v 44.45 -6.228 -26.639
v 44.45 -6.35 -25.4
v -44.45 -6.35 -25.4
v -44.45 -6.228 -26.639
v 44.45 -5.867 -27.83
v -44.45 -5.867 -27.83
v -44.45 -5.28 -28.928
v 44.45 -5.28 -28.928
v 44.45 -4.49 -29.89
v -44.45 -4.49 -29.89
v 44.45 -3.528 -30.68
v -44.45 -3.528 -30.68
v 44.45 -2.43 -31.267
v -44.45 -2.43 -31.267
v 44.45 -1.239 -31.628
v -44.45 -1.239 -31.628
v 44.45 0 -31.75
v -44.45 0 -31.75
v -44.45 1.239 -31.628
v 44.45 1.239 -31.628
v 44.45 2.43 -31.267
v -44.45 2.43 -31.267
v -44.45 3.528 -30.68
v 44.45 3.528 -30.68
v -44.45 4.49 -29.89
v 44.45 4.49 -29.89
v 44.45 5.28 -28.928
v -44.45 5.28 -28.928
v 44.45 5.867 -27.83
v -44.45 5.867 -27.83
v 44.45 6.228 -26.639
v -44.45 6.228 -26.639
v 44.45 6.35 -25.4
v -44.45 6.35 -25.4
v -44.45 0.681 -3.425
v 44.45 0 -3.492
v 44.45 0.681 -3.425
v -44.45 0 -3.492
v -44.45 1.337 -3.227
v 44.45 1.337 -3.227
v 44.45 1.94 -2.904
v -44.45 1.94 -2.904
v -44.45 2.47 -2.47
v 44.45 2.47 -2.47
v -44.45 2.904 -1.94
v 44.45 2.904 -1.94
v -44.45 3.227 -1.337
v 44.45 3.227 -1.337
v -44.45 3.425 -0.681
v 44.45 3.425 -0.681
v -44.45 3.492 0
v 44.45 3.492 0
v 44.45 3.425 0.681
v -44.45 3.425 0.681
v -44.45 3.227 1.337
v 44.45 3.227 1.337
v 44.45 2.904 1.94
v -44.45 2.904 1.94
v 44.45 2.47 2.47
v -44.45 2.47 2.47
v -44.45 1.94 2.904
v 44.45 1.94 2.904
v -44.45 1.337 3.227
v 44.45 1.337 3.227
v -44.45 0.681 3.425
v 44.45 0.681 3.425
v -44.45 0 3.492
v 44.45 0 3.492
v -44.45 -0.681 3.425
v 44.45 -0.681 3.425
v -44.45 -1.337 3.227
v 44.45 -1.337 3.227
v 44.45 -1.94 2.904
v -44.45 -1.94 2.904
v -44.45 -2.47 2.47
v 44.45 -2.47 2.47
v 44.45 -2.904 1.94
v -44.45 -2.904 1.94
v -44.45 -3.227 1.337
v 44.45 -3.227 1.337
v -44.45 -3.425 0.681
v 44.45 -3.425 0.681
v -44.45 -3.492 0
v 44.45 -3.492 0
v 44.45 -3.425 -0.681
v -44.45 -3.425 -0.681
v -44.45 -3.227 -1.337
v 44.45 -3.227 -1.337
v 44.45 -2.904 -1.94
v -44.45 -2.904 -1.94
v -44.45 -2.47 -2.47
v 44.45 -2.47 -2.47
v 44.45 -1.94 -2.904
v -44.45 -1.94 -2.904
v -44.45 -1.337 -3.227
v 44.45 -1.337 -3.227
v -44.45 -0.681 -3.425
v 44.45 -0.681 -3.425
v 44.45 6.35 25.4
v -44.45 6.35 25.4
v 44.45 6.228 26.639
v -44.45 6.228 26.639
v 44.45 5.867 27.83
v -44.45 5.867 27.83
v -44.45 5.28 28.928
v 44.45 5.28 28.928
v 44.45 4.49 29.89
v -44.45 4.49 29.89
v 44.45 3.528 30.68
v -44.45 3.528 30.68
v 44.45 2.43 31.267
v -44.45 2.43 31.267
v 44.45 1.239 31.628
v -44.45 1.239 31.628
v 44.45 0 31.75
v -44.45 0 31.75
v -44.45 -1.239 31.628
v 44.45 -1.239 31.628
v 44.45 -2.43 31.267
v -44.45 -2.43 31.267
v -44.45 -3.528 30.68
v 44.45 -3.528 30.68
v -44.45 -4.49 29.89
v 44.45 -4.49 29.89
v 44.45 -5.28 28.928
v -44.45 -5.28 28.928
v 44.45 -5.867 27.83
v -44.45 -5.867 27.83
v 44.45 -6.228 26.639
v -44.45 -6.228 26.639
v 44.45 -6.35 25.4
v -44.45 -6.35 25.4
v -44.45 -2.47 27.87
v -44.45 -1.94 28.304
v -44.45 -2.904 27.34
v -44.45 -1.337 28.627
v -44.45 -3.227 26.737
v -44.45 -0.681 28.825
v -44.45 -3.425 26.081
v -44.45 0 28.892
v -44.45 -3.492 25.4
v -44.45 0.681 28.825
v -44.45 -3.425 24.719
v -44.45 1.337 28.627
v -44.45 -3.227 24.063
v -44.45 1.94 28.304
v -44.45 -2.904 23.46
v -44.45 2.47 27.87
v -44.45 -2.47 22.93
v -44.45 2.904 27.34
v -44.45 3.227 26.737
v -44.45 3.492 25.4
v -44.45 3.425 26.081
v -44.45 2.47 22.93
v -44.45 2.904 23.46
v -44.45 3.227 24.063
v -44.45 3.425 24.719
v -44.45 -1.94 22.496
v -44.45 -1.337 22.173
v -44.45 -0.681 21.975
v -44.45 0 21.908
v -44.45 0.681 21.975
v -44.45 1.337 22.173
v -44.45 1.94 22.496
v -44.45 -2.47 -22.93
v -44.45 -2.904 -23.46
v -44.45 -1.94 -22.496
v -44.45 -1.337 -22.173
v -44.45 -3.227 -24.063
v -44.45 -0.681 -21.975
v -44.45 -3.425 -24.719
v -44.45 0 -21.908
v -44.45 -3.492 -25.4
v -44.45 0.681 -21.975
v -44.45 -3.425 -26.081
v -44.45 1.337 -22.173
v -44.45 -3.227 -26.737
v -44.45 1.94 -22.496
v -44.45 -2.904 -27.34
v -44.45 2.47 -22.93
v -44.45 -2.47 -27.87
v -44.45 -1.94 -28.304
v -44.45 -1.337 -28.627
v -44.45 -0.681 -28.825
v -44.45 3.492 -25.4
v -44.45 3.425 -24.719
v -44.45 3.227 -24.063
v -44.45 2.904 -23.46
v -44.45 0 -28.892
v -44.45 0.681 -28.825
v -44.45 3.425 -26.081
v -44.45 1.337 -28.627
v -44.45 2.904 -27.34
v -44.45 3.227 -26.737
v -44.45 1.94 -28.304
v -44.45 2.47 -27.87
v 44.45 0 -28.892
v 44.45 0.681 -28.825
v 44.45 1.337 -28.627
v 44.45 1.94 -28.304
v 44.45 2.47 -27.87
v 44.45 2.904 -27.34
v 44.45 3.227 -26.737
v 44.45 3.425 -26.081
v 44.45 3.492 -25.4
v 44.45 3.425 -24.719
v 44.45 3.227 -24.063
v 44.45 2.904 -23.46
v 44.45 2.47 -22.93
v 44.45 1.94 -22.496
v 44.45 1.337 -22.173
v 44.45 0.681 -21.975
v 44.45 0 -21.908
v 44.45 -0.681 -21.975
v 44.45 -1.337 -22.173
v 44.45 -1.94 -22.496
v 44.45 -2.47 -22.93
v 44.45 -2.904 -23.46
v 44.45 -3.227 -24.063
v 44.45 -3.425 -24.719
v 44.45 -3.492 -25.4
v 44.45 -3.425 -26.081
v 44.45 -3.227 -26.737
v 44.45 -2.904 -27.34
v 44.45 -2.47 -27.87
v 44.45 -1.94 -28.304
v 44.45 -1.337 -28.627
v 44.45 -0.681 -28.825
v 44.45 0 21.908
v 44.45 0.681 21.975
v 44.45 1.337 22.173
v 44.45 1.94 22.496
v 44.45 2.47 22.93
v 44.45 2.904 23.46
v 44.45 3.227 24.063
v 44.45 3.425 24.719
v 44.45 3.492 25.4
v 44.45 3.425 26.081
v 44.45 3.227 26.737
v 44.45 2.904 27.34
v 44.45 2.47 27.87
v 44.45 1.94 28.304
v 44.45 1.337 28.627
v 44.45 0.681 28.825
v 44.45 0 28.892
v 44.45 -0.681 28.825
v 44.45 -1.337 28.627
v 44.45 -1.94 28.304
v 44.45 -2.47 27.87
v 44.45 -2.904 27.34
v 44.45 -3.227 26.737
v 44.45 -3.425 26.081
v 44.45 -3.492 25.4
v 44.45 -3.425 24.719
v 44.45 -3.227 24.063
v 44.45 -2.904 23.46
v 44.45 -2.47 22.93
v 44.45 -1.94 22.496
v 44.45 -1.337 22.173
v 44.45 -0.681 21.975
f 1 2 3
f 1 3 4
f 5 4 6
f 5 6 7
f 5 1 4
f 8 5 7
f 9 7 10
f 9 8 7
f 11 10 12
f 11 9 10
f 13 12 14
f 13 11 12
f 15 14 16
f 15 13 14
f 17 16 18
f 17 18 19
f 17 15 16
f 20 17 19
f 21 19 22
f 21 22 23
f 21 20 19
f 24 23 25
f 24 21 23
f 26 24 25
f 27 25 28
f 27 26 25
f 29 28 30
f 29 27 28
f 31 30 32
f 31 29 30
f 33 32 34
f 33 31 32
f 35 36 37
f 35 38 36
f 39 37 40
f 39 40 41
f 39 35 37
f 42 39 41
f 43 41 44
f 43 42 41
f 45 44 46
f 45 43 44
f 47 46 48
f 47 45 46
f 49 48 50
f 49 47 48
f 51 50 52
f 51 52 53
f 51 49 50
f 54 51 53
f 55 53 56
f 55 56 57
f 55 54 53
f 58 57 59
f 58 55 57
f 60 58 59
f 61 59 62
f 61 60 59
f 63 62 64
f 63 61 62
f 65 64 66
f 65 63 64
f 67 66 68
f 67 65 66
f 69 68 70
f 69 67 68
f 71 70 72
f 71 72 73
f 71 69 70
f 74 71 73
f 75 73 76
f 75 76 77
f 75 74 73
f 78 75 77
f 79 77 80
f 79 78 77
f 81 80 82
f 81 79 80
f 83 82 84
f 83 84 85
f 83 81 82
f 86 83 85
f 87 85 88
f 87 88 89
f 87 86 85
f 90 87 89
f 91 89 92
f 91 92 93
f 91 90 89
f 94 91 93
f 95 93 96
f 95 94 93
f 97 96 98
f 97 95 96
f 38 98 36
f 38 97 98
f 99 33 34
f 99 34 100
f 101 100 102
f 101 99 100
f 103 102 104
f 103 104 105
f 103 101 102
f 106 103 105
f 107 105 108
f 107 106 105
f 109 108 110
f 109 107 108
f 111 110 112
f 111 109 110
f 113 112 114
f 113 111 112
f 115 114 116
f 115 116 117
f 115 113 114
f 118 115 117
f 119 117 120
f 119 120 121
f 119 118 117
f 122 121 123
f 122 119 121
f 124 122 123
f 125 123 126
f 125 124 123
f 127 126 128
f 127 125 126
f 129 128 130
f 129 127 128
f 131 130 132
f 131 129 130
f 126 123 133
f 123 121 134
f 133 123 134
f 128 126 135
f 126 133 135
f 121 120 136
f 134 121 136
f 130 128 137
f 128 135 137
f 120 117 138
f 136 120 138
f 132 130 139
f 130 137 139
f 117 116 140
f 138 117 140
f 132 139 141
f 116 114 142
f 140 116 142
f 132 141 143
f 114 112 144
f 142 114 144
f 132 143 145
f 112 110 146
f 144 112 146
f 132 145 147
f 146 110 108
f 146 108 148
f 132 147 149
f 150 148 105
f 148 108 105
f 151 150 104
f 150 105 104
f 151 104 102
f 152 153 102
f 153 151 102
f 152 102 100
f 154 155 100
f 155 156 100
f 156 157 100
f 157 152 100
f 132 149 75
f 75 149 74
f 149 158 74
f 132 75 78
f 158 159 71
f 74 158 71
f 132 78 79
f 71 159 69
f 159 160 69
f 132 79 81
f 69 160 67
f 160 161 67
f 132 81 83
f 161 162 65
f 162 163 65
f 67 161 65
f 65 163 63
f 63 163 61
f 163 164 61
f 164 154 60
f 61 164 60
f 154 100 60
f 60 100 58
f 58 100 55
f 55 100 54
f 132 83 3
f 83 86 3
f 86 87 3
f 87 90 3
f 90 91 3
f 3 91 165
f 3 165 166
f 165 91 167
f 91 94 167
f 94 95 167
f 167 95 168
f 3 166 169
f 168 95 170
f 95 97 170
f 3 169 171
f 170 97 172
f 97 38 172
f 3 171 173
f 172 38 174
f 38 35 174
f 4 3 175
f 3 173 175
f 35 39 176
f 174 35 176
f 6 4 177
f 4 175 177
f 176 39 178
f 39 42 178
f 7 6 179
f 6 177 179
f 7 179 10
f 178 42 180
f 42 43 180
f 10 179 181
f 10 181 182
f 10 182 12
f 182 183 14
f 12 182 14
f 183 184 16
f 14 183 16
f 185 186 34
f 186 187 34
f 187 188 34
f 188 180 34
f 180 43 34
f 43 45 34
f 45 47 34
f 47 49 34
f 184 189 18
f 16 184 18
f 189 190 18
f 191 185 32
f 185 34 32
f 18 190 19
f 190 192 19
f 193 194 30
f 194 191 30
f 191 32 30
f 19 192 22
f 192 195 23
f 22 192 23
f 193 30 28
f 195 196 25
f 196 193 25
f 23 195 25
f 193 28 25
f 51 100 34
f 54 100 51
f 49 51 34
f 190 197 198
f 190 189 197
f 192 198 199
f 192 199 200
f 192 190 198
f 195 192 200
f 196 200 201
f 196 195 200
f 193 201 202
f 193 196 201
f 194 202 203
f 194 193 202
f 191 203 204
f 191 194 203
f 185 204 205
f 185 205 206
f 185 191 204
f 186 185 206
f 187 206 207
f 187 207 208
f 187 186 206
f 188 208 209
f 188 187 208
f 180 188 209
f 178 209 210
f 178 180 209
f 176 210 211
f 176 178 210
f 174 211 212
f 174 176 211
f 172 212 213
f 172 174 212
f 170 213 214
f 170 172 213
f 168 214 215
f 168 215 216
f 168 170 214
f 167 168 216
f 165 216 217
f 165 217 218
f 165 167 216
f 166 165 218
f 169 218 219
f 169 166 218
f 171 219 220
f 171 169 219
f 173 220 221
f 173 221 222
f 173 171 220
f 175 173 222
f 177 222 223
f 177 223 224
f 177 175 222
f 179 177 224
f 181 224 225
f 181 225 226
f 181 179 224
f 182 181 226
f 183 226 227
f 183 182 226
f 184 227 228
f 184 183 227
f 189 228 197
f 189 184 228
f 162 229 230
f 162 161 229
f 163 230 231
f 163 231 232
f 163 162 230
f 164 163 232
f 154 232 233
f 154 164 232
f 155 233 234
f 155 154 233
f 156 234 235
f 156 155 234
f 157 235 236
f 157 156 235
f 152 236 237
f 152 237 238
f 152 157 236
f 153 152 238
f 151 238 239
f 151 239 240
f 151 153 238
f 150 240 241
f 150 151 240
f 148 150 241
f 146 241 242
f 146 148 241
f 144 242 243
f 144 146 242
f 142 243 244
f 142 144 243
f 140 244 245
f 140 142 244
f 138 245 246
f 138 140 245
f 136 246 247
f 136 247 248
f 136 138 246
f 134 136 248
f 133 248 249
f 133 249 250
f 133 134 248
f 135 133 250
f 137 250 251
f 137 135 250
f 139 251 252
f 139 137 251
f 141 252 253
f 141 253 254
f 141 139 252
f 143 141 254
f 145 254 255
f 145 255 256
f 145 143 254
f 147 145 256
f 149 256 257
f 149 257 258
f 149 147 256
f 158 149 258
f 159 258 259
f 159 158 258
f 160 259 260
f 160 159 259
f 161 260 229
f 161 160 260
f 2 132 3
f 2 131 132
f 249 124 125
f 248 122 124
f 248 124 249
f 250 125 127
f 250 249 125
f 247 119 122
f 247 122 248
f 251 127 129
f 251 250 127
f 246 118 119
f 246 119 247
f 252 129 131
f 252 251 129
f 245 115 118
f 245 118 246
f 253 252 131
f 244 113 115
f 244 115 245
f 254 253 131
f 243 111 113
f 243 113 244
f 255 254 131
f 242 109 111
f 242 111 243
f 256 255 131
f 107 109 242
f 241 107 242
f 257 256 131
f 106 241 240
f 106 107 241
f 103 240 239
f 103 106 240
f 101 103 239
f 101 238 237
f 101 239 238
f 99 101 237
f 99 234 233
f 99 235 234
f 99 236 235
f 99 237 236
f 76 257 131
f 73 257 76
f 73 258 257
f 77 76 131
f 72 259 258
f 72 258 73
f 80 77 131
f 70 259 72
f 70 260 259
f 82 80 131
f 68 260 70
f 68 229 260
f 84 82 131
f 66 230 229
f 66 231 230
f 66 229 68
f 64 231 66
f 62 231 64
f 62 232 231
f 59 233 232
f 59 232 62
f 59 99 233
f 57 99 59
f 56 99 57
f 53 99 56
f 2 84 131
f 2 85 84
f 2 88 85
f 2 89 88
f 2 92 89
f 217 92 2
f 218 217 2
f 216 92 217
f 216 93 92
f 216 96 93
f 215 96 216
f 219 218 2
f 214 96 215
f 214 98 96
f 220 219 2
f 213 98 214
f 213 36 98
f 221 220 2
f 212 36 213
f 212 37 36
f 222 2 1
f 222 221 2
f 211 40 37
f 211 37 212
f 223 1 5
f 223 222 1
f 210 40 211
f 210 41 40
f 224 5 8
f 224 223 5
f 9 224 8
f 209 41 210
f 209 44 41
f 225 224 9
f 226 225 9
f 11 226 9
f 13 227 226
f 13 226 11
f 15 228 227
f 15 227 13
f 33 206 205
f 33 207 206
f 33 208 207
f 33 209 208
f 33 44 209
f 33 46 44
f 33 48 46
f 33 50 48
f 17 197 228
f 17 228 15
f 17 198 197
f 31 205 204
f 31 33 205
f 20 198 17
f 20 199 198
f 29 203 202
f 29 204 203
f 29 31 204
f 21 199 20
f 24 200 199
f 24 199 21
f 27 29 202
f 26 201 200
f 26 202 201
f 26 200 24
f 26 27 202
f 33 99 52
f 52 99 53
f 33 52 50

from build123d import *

# Parameters (mm, degrees)
SKETCH1_R           = 3.4925
BOSS_EXTRUDE1_DEPTH = 44.45


with BuildPart() as part:
    # Sketch1 → Boss-Extrude1 (new body, symmetric)
    with BuildSketch(Plane(origin=(0, 0, 0), x_dir=(0, 0, -1), z_dir=(1, 0, 0))):
        with BuildLine():
            Line((-25.4, -6.35), (25.4, -6.35))
            ThreePointArc((25.4, -6.35), (31.75, 0), (25.4, 6.35))
            Line((25.4, 6.35), (-25.4, 6.35))
            ThreePointArc((-25.4, 6.35), (-31.75, 0), (-25.4, -6.35))
        make_face()
        with Locations((-25.4, 0)):
            Circle(SKETCH1_R, mode=Mode.SUBTRACT)
        with Locations((25.4, 0)):
            Circle(SKETCH1_R, mode=Mode.SUBTRACT)
        Circle(SKETCH1_R, mode=Mode.SUBTRACT)
    extrude(amount=BOSS_EXTRUDE1_DEPTH, both=True)


solid = part.part
